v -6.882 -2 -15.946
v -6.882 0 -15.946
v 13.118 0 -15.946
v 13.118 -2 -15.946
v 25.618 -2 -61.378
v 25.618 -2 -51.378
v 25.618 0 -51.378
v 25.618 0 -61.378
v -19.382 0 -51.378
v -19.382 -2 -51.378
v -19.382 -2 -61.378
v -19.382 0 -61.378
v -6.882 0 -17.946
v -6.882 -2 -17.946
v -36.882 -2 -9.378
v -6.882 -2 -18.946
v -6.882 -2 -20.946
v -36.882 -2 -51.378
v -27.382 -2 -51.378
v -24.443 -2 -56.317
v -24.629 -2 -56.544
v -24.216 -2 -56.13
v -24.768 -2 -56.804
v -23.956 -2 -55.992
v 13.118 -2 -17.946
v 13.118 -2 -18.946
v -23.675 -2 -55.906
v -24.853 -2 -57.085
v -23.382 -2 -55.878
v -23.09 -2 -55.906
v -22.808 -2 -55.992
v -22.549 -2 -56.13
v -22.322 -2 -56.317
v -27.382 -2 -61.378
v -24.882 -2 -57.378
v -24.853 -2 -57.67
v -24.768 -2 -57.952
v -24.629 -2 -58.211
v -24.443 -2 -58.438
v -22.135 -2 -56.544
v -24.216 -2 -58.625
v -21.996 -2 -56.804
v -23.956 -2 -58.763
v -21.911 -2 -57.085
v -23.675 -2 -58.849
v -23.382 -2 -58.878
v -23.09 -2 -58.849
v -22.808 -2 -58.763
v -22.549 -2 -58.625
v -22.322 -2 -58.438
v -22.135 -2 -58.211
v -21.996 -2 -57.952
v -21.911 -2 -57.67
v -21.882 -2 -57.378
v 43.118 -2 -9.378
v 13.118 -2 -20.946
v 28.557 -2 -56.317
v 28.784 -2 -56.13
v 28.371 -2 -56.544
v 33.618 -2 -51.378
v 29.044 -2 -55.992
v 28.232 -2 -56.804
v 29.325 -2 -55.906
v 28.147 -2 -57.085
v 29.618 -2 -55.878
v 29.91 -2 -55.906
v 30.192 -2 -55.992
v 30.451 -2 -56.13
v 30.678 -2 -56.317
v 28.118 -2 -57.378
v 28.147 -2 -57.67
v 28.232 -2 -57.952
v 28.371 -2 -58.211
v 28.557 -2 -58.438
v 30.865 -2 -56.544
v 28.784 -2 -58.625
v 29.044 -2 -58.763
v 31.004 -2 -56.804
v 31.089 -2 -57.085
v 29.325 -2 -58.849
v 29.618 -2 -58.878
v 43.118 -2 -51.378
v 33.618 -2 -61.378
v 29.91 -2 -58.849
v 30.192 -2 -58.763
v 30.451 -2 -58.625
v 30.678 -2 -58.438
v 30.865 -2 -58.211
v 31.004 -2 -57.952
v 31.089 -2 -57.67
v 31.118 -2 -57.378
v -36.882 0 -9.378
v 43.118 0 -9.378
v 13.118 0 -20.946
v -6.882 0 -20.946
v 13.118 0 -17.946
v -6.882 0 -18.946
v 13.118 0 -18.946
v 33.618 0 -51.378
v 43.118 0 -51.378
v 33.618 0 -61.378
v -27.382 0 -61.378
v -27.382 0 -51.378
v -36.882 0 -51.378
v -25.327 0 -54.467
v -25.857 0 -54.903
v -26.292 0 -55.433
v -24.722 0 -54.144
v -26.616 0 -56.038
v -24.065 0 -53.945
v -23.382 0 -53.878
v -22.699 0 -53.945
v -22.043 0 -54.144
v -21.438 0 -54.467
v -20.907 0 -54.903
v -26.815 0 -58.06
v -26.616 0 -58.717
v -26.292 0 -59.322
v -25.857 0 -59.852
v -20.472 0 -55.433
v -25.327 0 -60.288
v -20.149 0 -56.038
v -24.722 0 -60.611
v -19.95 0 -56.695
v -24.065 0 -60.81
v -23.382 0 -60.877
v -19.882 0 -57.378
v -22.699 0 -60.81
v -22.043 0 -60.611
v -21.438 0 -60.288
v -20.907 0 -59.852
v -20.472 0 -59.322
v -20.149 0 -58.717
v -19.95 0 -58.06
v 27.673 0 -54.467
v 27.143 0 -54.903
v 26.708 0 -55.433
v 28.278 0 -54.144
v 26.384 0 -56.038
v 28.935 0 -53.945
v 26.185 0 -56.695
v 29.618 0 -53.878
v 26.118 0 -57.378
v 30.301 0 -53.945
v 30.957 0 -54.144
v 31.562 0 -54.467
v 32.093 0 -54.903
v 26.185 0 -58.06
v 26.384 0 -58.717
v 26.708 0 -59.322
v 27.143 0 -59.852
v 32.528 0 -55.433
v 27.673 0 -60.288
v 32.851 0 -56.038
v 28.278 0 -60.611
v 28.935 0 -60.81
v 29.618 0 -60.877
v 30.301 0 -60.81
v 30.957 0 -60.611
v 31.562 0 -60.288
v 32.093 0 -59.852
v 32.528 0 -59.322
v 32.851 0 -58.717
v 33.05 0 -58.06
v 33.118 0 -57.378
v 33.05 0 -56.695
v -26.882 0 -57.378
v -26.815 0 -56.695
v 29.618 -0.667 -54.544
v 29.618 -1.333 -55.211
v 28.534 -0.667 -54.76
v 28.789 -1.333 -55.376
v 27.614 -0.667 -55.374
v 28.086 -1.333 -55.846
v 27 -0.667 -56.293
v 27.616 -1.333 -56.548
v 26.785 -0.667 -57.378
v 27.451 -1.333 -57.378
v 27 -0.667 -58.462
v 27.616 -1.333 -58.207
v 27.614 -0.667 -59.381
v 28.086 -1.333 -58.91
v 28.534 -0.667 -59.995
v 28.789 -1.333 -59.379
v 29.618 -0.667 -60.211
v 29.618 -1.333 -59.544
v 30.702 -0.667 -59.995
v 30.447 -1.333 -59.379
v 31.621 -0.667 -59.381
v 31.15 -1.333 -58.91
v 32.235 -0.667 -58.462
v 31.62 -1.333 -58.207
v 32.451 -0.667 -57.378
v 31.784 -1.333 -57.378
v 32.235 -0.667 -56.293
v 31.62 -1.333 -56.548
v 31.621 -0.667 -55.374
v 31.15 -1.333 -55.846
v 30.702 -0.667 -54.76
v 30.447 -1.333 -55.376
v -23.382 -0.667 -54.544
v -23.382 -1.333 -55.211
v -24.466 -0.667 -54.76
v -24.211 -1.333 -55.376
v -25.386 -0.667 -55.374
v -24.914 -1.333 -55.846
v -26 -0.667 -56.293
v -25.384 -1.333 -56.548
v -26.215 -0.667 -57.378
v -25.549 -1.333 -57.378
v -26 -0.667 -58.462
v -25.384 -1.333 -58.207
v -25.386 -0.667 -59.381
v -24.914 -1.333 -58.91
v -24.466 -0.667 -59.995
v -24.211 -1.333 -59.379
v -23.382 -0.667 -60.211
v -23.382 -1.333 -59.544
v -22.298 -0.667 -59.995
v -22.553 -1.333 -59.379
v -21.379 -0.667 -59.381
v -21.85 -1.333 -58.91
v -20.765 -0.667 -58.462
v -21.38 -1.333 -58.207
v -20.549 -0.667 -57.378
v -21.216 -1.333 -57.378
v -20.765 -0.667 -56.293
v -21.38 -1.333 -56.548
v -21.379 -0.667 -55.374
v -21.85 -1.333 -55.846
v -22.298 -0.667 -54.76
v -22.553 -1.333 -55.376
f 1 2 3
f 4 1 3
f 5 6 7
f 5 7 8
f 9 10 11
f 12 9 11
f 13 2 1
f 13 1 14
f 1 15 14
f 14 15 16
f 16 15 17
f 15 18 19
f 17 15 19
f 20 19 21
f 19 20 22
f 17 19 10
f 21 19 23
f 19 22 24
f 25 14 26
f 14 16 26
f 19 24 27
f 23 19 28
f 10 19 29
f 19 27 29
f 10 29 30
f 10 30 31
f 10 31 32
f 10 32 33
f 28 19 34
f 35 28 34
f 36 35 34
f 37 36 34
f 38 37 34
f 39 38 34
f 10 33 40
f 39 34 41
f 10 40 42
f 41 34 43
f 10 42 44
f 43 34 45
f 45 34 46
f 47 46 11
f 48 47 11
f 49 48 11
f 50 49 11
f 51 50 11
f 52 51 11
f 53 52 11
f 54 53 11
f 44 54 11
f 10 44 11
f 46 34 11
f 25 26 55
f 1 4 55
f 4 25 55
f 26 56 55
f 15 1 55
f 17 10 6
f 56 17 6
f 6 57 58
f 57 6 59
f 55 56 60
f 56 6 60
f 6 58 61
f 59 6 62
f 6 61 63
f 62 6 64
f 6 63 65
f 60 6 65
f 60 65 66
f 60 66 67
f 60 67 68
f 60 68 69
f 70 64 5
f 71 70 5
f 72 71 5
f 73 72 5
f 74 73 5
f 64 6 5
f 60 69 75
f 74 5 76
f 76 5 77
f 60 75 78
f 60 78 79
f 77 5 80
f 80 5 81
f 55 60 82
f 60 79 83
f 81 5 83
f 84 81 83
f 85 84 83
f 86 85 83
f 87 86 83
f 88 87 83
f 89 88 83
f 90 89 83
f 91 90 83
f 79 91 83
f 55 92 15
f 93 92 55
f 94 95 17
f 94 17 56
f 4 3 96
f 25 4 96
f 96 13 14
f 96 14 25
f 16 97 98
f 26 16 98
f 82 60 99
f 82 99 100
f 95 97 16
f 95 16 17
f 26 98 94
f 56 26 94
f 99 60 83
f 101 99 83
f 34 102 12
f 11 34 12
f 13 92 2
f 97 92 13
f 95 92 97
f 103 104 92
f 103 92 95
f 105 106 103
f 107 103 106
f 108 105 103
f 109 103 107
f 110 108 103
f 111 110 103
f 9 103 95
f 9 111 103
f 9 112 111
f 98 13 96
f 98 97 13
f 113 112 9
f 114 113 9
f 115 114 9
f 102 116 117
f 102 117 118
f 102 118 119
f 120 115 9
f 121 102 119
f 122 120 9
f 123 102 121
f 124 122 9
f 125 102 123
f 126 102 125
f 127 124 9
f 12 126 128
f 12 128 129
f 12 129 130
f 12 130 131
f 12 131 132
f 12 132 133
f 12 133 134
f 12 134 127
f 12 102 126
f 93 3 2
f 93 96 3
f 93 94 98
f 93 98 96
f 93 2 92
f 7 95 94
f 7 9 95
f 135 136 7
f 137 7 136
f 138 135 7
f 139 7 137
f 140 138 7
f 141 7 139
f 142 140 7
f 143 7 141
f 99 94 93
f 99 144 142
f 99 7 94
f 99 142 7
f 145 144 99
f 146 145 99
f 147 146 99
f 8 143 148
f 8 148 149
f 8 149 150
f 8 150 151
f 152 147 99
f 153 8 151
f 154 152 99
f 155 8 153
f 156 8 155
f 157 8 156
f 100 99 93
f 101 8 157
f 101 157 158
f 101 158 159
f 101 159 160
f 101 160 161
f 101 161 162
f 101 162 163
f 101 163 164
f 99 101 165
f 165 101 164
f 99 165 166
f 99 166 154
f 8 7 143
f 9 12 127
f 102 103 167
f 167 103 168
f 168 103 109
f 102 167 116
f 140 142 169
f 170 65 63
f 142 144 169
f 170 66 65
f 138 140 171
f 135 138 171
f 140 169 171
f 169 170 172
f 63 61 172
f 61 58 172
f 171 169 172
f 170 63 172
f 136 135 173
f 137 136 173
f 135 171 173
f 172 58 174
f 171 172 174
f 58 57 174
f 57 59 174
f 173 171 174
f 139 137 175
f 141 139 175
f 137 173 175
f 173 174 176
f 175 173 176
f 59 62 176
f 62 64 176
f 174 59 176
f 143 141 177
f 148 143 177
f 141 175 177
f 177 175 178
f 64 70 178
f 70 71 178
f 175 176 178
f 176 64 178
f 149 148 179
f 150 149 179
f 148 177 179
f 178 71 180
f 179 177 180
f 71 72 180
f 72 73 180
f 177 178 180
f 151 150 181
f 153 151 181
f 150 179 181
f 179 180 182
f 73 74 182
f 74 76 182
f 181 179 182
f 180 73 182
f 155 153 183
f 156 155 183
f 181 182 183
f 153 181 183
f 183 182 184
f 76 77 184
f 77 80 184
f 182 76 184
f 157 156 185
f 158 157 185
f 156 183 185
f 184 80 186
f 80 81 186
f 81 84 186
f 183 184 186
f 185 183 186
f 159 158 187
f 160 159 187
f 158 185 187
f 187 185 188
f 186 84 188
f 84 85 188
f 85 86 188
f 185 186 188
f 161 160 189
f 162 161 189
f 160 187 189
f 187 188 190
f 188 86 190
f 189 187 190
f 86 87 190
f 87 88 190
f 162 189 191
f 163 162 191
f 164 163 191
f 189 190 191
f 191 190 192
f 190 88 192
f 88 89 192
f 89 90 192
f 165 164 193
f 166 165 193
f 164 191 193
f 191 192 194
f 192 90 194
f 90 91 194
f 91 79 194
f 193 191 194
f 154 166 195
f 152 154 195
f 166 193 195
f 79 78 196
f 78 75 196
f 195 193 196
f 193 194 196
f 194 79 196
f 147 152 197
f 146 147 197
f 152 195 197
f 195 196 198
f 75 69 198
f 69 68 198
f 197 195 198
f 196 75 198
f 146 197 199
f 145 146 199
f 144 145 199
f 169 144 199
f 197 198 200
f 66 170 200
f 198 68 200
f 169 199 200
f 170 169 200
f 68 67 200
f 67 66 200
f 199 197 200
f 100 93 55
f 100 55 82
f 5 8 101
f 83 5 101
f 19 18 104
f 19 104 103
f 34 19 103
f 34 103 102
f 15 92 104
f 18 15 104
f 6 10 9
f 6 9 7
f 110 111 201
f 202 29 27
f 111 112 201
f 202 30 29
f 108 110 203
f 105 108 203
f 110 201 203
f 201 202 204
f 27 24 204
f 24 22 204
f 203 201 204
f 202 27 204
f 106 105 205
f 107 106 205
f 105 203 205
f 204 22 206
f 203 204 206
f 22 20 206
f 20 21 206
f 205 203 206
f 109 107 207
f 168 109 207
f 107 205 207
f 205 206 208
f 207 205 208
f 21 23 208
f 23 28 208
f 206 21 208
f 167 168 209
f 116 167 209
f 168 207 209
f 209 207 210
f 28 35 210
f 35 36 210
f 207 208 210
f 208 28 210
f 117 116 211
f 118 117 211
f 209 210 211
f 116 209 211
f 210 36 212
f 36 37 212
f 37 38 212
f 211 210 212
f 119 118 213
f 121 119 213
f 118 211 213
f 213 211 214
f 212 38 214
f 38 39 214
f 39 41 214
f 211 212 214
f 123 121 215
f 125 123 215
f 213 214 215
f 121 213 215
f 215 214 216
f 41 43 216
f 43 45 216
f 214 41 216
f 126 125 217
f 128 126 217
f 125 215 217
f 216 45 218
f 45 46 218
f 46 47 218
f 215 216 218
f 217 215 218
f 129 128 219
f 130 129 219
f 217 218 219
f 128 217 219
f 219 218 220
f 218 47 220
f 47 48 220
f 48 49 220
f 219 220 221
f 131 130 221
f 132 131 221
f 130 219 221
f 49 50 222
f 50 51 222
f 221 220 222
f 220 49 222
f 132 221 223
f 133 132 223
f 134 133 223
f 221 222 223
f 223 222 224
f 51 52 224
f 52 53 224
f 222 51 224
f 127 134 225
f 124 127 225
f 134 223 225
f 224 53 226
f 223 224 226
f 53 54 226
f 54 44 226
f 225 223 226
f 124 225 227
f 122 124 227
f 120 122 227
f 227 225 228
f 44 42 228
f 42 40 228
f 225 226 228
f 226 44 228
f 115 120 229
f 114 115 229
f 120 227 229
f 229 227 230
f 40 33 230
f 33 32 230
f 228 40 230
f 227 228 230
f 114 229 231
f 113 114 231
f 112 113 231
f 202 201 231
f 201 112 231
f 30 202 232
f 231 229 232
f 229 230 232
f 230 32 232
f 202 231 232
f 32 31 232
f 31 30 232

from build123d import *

# Parameters (mm, degrees)
SKETCH_4_W               = 80
SKETCH_4_H               = 52
EXTRUDE_2_DEPTH          = 2
CUT_EXTRUDE_4_DEPTH      = 35
CUT_EXTRUDE_4_DEPTH_BACK = 32
SKETCH_5_W               = 9.5
SKETCH_5_H               = 10
CUT_EXTRUDE_5_DEPTH      = 54
CUT_EXTRUDE_5_DEPTH_BACK = 45
SKETCH_6_W               = 45
SKETCH_6_H               = 10
CUT_EXTRUDE_6_DEPTH      = 64
CUT_EXTRUDE_6_DEPTH_BACK = 67
SKETCH_7_W               = 9.5
SKETCH_7_H               = 10
CUT_EXTRUDE_7_DEPTH      = 30
CUT_EXTRUDE_7_DEPTH_BACK = 30
SKETCH_8_R               = 1.5
CHAMFER_1_SIZE           = 2
CUT_EXTRUDE_8_DEPTH      = 20
CUT_EXTRUDE_8_DEPTH_BACK = 33
SKETCH_9_R               = 1.5
CHAMFER_2_SIZE           = 2
SKETCH_10_W              = 20
SKETCH_10_H              = 2
CUT_EXTRUDE_9_DEPTH      = 2


with BuildPart() as part:
    # Эскиз4 → Бобышка-Вытянуть2 (new body)
    with BuildSketch(Plane(origin=(0, 0, 0), x_dir=(1, 0, 0), z_dir=(0, 1, 0))):
        with Locations((3.117803535, 35.377543141)):
            Rectangle(SKETCH_4_W, SKETCH_4_H)
    extrude(amount=-EXTRUDE_2_DEPTH)

    # Эскиз5 → Вырез-Вытянуть4 (cut, two sides: drawn at the far end of the back side and taken through both)
    with BuildSketch(Plane(origin=(0, 0, 0), x_dir=(1, 0, 0), z_dir=(0, 1, 0)).offset(-CUT_EXTRUDE_4_DEPTH_BACK)):
        with Locations((-32.132196465, 56.377543141)):
            Rectangle(SKETCH_5_W, SKETCH_5_H)
    extrude(amount=CUT_EXTRUDE_4_DEPTH + CUT_EXTRUDE_4_DEPTH_BACK, mode=Mode.SUBTRACT)

    # Эскиз6 → Вырез-Вытянуть5 (cut, two sides: drawn at the far end of the back side and taken through both)
    with BuildSketch(Plane(origin=(0, 0, 0), x_dir=(1, 0, 0), z_dir=(0, 1, 0)).offset(-CUT_EXTRUDE_5_DEPTH_BACK)):
        with Locations((3.117803535, 56.377543141)):
            Rectangle(SKETCH_6_W, SKETCH_6_H)
    extrude(amount=CUT_EXTRUDE_5_DEPTH + CUT_EXTRUDE_5_DEPTH_BACK, mode=Mode.SUBTRACT)

    # Эскиз7 → Вырез-Вытянуть6 (cut, two sides: drawn at the far end of the back side and taken through both)
    with BuildSketch(Plane(origin=(0, 0, 0), x_dir=(1, 0, 0), z_dir=(0, 1, 0)).offset(-CUT_EXTRUDE_6_DEPTH_BACK)):
        with Locations((38.367803535, 56.377543141)):
            Rectangle(SKETCH_7_W, SKETCH_7_H)
    extrude(amount=CUT_EXTRUDE_6_DEPTH + CUT_EXTRUDE_6_DEPTH_BACK, mode=Mode.SUBTRACT)

    # Эскиз8 → Вырез-Вытянуть7 (cut, two sides: drawn at the far end of the back side and taken through both)
    with BuildSketch(Plane(origin=(0, 0, 0), x_dir=(1, 0, 0), z_dir=(0, 1, 0)).offset(-CUT_EXTRUDE_7_DEPTH_BACK)):
        with Locations(Location((-23.382196465, 57.377543141, 0), (0, 0, 270))):
            Circle(SKETCH_8_R)
    extrude(amount=CUT_EXTRUDE_7_DEPTH + CUT_EXTRUDE_7_DEPTH_BACK, mode=Mode.SUBTRACT)

    # Фаска1
    chamfer_1_edges = [part.edges().sort_by_distance(p)[0] for p in [
        (-23.382196465, 0, -58.877543141),
    ]]
    chamfer(chamfer_1_edges, length=CHAMFER_1_SIZE - 0.0001)  # a hair under: the kernel refuses the full size

    # Эскиз9 → Вырез-Вытянуть8 (cut, two sides: drawn at the far end of the back side and taken through both)
    with BuildSketch(Plane(origin=(0, 0, 0), x_dir=(1, 0, 0), z_dir=(0, 1, 0)).offset(-CUT_EXTRUDE_8_DEPTH_BACK)):
        with Locations(Location((29.617803535, 57.377543141, 0), (0, 0, 270))):
            Circle(SKETCH_9_R)
    extrude(amount=CUT_EXTRUDE_8_DEPTH + CUT_EXTRUDE_8_DEPTH_BACK, mode=Mode.SUBTRACT)

    # Фаска2
    chamfer_2_edges = [part.edges().sort_by_distance(p)[0] for p in [
        (29.617803535, 0, -58.877543141),
    ]]
    chamfer(chamfer_2_edges, length=CHAMFER_2_SIZE - 0.0001)  # a hair under: the kernel refuses the full size

    # Эскиз10 → Вырез-Вытянуть9 (cut)
    with BuildSketch(Plane(origin=(0, 0, 0), x_dir=(1, 0, 0), z_dir=(0, 1, 0))):
        with Locations((3.117803535, 16.946236335)):
            Rectangle(SKETCH_10_W, SKETCH_10_H)
        with Locations((3.117803535, 19.946236335)):
            Rectangle(SKETCH_10_W, SKETCH_10_H)
    extrude(amount=-CUT_EXTRUDE_9_DEPTH, mode=Mode.SUBTRACT)


solid = part.part
